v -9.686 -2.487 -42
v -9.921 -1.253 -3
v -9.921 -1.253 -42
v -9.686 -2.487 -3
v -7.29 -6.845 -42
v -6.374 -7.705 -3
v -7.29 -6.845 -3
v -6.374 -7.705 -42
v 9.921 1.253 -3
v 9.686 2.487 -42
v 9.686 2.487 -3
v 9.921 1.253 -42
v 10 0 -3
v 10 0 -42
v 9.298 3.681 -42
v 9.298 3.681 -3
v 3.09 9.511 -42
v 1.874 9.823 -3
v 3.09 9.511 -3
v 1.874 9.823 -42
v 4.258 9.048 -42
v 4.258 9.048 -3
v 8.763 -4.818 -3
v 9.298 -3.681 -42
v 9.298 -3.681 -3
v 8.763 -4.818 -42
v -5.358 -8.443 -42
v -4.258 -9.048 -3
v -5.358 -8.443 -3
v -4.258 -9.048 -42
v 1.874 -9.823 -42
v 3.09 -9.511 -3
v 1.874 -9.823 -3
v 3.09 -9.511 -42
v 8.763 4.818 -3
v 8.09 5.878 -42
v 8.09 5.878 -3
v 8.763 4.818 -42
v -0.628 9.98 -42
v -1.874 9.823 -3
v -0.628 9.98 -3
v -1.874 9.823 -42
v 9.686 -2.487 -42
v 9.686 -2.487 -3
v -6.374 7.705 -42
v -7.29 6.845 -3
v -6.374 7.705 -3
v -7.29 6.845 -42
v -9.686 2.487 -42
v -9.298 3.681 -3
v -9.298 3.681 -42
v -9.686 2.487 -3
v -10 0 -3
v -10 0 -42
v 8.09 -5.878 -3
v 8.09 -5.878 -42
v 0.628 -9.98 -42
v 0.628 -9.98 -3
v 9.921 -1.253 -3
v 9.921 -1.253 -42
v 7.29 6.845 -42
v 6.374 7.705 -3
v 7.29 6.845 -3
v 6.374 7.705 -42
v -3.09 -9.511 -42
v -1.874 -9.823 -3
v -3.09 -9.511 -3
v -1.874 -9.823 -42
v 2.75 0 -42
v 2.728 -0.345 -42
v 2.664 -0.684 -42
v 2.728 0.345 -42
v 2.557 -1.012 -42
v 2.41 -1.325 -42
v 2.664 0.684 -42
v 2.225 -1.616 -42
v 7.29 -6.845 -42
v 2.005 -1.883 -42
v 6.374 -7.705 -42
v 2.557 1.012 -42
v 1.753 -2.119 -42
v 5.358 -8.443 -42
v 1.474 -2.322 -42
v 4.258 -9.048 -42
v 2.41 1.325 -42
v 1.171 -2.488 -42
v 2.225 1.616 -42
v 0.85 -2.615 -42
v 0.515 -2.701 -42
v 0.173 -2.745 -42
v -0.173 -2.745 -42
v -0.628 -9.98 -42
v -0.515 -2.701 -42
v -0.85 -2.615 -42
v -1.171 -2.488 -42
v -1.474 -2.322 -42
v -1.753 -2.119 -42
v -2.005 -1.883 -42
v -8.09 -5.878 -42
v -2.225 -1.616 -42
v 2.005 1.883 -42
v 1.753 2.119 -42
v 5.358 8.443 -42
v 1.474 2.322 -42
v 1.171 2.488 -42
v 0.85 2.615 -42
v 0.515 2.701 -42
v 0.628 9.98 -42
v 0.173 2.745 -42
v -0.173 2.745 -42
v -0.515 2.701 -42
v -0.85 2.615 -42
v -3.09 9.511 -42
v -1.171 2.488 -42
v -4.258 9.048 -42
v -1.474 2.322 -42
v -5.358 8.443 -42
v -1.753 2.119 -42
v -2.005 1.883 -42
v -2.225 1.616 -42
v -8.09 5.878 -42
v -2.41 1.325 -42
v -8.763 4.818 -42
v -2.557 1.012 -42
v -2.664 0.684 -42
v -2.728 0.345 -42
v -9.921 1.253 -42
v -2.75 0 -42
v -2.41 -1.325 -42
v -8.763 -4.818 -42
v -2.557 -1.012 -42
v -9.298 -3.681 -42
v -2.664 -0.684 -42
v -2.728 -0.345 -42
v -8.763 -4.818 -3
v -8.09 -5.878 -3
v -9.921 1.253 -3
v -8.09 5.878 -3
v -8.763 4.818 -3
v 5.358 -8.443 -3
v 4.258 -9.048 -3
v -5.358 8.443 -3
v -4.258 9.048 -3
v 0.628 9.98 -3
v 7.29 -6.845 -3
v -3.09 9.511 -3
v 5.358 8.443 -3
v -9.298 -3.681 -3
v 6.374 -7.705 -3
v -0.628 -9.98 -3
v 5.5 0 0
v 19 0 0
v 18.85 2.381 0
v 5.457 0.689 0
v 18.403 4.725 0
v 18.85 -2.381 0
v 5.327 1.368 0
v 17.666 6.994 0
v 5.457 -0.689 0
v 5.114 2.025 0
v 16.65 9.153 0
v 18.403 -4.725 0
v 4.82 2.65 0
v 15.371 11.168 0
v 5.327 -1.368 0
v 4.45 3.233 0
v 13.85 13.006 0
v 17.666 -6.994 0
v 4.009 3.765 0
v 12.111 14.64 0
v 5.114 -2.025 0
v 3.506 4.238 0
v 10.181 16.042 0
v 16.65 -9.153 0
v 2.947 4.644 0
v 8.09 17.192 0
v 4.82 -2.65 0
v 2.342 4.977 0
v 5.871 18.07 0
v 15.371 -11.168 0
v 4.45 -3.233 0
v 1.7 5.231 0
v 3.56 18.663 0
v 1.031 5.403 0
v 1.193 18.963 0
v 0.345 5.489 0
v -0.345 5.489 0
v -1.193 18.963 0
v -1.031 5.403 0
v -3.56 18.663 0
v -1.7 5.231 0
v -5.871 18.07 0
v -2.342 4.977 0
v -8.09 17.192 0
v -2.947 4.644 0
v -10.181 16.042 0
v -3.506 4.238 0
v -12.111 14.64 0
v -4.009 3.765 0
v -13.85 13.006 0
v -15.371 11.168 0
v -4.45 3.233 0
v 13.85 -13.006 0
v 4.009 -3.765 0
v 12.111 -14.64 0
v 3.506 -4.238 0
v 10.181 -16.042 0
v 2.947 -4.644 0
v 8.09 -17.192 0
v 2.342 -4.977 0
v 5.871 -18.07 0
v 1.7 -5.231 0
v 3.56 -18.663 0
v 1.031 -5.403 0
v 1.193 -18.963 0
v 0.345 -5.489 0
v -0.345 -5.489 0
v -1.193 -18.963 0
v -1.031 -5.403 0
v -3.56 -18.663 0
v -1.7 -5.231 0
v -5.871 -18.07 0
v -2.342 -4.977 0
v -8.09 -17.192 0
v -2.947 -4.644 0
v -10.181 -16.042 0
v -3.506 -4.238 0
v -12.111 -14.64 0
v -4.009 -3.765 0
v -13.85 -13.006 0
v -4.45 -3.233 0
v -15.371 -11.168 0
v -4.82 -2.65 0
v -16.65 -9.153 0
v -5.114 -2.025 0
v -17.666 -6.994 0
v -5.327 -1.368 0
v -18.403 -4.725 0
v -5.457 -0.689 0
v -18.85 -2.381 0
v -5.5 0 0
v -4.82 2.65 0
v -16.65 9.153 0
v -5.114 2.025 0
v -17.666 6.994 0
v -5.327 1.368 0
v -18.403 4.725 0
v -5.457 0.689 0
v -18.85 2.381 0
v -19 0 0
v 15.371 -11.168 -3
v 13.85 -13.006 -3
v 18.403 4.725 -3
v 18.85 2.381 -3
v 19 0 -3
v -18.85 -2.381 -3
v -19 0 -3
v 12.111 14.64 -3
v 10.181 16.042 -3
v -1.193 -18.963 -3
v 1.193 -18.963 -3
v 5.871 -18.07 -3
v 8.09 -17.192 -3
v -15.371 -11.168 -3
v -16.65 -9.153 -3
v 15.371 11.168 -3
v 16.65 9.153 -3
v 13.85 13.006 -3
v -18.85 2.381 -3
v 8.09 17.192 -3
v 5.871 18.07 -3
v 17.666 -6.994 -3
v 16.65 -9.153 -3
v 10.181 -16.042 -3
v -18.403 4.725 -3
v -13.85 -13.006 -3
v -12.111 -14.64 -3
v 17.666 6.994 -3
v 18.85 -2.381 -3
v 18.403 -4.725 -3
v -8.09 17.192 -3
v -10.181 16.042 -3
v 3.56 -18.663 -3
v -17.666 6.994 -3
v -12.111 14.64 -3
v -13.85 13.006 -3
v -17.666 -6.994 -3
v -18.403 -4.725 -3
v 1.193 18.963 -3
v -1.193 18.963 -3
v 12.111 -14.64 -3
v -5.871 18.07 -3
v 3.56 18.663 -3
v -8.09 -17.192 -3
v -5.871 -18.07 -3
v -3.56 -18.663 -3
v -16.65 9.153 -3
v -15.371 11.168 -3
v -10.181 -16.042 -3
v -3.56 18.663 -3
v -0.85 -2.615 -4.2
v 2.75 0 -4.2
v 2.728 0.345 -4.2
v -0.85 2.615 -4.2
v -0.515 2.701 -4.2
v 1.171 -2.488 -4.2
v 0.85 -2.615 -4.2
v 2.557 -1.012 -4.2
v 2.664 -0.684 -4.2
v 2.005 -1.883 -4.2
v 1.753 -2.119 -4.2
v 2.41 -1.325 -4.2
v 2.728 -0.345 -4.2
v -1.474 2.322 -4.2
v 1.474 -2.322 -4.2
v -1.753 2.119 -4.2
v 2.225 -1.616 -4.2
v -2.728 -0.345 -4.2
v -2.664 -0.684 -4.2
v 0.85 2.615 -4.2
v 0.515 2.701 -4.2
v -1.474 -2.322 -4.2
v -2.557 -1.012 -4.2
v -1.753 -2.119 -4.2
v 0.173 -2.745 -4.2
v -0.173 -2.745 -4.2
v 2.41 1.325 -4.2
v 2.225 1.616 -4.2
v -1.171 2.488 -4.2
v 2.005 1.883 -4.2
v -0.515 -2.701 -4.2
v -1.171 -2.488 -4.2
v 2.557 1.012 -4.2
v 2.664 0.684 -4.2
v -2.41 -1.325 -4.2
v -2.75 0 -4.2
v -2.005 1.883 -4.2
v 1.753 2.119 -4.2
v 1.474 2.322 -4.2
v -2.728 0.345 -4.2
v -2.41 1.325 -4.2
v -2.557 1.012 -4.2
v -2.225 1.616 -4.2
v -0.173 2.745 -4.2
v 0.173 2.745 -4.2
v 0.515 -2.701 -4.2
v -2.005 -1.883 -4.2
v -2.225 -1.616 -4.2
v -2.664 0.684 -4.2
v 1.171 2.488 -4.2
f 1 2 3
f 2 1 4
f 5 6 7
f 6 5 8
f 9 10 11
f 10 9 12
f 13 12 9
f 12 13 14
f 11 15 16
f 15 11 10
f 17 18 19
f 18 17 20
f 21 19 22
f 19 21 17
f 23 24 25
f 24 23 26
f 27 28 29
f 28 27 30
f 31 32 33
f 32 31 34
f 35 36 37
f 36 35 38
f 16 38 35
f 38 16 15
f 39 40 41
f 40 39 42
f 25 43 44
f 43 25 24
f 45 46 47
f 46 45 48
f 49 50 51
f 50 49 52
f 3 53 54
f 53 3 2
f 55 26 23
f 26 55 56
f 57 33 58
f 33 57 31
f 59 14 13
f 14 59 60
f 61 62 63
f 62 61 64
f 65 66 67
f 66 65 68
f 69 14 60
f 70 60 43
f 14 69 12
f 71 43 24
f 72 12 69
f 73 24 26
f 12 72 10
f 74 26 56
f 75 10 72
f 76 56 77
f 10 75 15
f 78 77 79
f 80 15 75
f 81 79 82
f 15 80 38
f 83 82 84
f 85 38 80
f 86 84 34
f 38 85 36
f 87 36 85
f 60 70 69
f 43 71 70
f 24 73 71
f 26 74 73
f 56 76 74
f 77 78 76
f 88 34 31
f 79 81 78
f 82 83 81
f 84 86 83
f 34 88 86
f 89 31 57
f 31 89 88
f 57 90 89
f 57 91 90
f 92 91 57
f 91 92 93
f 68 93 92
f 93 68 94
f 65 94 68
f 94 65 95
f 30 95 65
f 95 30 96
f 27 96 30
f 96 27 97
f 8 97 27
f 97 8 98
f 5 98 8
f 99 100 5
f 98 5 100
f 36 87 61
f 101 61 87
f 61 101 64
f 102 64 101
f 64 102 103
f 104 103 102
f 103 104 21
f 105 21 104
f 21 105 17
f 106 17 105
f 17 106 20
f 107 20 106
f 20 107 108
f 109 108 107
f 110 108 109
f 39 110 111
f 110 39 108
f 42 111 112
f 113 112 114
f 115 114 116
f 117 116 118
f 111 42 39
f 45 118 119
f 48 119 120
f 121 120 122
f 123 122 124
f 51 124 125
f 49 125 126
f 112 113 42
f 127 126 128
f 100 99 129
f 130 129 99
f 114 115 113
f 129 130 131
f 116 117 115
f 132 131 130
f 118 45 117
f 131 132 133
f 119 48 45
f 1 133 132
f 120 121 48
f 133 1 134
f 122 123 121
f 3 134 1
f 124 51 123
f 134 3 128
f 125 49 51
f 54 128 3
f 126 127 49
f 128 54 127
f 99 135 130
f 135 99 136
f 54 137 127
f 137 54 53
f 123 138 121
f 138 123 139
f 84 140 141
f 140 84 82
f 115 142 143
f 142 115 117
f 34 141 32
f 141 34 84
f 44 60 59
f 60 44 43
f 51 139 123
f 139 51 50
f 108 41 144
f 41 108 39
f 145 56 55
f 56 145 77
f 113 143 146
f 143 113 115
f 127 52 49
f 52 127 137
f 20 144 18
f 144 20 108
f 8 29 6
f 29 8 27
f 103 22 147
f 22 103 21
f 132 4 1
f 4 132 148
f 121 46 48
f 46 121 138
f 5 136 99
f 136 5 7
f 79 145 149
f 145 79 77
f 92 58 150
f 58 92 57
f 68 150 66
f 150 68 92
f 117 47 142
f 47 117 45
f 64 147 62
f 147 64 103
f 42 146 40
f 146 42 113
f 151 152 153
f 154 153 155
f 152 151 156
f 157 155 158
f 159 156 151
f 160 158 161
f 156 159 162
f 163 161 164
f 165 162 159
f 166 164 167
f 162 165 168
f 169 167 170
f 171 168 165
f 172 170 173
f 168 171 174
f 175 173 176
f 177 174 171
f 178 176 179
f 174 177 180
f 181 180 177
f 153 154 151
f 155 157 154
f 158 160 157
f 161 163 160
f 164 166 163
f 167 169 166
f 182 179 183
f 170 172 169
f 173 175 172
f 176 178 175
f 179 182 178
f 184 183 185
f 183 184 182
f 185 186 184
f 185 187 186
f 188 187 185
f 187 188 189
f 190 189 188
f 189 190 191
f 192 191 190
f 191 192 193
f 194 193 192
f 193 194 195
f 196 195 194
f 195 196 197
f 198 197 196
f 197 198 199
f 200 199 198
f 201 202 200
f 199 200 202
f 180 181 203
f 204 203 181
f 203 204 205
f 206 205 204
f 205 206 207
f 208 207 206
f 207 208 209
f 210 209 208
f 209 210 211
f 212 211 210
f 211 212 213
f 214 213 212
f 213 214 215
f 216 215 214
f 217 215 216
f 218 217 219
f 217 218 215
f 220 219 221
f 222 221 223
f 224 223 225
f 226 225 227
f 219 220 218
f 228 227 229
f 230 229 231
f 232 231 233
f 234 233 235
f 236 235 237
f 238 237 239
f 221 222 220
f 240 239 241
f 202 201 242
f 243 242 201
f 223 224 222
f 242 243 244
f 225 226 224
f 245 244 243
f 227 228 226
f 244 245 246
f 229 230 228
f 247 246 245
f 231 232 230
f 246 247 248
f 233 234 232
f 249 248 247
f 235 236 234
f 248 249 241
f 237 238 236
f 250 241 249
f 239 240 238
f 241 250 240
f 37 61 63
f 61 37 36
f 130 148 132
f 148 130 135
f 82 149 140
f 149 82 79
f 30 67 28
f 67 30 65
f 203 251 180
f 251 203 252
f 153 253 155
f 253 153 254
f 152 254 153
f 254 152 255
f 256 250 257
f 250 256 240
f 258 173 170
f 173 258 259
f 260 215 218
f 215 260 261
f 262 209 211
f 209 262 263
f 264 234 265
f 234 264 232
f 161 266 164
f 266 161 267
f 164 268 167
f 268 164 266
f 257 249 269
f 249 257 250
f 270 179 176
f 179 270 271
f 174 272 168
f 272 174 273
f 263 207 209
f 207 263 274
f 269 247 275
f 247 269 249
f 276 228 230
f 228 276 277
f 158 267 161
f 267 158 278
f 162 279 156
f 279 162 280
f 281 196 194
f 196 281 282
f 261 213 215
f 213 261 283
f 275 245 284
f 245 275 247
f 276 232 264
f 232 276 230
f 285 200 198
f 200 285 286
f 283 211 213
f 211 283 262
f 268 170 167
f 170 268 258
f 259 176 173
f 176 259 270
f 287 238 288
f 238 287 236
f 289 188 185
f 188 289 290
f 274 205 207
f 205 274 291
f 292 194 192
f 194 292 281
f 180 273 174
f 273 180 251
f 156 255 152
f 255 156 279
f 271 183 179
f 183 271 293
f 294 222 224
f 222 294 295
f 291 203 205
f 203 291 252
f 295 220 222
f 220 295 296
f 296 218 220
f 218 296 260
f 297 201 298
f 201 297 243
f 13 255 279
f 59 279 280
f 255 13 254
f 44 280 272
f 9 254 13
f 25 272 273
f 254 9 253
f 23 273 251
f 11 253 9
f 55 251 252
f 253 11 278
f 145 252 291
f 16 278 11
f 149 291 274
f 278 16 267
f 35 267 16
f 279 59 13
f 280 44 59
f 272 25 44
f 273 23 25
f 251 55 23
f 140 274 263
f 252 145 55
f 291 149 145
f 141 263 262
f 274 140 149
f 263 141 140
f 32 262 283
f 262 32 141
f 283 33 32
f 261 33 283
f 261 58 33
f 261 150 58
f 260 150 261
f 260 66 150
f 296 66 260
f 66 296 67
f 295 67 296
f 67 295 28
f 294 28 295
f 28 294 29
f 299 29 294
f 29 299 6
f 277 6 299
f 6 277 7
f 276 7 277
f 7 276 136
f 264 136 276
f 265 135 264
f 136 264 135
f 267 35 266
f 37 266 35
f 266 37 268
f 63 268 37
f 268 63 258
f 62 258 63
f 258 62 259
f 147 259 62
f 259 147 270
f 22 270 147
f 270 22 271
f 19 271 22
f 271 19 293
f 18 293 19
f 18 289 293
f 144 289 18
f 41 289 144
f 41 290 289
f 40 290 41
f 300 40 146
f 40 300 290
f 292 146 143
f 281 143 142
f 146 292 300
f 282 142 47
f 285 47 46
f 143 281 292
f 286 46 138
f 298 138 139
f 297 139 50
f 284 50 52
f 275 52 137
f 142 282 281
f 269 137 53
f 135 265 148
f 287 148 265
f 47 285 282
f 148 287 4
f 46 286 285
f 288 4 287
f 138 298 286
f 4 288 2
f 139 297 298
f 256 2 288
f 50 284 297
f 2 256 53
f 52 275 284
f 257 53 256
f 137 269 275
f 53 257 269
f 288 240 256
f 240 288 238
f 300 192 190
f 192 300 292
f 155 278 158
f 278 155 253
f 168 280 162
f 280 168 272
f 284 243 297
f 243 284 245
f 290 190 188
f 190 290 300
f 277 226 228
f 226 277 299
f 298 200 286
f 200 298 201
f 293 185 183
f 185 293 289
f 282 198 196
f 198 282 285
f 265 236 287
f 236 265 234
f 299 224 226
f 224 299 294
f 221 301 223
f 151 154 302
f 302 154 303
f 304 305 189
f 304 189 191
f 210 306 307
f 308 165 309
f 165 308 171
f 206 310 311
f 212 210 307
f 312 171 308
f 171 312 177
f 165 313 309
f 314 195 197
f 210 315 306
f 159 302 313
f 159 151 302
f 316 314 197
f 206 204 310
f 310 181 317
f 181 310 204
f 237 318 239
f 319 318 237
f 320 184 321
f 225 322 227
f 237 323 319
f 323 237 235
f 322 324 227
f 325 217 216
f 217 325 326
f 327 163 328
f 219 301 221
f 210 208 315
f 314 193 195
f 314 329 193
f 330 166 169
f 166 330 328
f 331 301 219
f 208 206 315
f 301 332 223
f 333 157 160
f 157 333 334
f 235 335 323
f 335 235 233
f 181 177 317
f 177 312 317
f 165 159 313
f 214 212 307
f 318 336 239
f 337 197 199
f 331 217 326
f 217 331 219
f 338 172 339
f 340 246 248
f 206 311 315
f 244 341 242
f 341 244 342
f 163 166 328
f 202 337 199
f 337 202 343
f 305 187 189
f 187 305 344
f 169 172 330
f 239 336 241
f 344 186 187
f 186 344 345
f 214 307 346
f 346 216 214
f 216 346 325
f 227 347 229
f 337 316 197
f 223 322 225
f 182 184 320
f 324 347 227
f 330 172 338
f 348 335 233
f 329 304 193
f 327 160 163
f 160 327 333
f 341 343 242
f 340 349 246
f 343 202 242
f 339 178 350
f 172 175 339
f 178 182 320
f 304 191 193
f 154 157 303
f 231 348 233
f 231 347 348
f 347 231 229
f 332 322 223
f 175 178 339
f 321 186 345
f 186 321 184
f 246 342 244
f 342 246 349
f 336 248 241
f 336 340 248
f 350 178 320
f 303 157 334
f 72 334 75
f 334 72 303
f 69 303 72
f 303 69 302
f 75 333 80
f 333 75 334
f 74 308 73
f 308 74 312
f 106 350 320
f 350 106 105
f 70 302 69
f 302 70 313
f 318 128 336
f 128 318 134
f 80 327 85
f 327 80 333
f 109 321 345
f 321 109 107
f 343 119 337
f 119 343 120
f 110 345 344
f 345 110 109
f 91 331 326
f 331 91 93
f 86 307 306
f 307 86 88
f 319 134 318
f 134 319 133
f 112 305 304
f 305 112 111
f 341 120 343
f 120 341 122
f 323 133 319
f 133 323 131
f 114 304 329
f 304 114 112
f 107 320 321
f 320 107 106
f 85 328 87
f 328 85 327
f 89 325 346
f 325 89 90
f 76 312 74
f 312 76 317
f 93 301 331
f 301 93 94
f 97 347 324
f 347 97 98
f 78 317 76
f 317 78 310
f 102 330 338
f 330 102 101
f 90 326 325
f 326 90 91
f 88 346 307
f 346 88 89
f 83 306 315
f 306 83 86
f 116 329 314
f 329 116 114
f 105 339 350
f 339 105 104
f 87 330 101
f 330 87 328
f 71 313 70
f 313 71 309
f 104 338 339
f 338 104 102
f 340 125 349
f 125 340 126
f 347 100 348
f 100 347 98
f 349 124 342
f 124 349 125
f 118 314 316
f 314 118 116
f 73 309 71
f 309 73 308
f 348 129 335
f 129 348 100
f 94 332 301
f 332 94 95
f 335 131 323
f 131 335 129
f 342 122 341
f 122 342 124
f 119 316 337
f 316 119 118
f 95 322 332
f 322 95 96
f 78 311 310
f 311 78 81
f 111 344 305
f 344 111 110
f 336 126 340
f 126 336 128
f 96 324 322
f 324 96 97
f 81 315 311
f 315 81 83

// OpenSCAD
$fn = 50;


difference() {
	union() {
		translate(v = [0, 0, -42.0000000000]) {
			cylinder(h = 42, r = 10.0000000000);
		}
		translate(v = [0, 0, -3.0000000000]) {
			cylinder(h = 3, r = 19.0000000000);
		}
	}
	union() {
		translate(v = [0, 0, 0]) {
			rotate(a = [0, 0, 0]) {
				difference() {
					union() {
						#translate(v = [0, 0, -42.0000000000]) {
							cylinder(h = 42, r = 2.2500000000);
						}
						#translate(v = [0, 0, -4.2000000000]) {
							cylinder(h = 4.2000000000, r1 = 2.7500000000, r2 = 5.5000000000);
						}
						#translate(v = [0, 0, -42.0000000000]) {
							cylinder(h = 42, r = 2.7500000000);
						}
						#translate(v = [0, 0, -42.0000000000]) {
							cylinder(h = 42, r = 2.2500000000);
						}
					}
					union();
				}
			}
		}
	}
}
